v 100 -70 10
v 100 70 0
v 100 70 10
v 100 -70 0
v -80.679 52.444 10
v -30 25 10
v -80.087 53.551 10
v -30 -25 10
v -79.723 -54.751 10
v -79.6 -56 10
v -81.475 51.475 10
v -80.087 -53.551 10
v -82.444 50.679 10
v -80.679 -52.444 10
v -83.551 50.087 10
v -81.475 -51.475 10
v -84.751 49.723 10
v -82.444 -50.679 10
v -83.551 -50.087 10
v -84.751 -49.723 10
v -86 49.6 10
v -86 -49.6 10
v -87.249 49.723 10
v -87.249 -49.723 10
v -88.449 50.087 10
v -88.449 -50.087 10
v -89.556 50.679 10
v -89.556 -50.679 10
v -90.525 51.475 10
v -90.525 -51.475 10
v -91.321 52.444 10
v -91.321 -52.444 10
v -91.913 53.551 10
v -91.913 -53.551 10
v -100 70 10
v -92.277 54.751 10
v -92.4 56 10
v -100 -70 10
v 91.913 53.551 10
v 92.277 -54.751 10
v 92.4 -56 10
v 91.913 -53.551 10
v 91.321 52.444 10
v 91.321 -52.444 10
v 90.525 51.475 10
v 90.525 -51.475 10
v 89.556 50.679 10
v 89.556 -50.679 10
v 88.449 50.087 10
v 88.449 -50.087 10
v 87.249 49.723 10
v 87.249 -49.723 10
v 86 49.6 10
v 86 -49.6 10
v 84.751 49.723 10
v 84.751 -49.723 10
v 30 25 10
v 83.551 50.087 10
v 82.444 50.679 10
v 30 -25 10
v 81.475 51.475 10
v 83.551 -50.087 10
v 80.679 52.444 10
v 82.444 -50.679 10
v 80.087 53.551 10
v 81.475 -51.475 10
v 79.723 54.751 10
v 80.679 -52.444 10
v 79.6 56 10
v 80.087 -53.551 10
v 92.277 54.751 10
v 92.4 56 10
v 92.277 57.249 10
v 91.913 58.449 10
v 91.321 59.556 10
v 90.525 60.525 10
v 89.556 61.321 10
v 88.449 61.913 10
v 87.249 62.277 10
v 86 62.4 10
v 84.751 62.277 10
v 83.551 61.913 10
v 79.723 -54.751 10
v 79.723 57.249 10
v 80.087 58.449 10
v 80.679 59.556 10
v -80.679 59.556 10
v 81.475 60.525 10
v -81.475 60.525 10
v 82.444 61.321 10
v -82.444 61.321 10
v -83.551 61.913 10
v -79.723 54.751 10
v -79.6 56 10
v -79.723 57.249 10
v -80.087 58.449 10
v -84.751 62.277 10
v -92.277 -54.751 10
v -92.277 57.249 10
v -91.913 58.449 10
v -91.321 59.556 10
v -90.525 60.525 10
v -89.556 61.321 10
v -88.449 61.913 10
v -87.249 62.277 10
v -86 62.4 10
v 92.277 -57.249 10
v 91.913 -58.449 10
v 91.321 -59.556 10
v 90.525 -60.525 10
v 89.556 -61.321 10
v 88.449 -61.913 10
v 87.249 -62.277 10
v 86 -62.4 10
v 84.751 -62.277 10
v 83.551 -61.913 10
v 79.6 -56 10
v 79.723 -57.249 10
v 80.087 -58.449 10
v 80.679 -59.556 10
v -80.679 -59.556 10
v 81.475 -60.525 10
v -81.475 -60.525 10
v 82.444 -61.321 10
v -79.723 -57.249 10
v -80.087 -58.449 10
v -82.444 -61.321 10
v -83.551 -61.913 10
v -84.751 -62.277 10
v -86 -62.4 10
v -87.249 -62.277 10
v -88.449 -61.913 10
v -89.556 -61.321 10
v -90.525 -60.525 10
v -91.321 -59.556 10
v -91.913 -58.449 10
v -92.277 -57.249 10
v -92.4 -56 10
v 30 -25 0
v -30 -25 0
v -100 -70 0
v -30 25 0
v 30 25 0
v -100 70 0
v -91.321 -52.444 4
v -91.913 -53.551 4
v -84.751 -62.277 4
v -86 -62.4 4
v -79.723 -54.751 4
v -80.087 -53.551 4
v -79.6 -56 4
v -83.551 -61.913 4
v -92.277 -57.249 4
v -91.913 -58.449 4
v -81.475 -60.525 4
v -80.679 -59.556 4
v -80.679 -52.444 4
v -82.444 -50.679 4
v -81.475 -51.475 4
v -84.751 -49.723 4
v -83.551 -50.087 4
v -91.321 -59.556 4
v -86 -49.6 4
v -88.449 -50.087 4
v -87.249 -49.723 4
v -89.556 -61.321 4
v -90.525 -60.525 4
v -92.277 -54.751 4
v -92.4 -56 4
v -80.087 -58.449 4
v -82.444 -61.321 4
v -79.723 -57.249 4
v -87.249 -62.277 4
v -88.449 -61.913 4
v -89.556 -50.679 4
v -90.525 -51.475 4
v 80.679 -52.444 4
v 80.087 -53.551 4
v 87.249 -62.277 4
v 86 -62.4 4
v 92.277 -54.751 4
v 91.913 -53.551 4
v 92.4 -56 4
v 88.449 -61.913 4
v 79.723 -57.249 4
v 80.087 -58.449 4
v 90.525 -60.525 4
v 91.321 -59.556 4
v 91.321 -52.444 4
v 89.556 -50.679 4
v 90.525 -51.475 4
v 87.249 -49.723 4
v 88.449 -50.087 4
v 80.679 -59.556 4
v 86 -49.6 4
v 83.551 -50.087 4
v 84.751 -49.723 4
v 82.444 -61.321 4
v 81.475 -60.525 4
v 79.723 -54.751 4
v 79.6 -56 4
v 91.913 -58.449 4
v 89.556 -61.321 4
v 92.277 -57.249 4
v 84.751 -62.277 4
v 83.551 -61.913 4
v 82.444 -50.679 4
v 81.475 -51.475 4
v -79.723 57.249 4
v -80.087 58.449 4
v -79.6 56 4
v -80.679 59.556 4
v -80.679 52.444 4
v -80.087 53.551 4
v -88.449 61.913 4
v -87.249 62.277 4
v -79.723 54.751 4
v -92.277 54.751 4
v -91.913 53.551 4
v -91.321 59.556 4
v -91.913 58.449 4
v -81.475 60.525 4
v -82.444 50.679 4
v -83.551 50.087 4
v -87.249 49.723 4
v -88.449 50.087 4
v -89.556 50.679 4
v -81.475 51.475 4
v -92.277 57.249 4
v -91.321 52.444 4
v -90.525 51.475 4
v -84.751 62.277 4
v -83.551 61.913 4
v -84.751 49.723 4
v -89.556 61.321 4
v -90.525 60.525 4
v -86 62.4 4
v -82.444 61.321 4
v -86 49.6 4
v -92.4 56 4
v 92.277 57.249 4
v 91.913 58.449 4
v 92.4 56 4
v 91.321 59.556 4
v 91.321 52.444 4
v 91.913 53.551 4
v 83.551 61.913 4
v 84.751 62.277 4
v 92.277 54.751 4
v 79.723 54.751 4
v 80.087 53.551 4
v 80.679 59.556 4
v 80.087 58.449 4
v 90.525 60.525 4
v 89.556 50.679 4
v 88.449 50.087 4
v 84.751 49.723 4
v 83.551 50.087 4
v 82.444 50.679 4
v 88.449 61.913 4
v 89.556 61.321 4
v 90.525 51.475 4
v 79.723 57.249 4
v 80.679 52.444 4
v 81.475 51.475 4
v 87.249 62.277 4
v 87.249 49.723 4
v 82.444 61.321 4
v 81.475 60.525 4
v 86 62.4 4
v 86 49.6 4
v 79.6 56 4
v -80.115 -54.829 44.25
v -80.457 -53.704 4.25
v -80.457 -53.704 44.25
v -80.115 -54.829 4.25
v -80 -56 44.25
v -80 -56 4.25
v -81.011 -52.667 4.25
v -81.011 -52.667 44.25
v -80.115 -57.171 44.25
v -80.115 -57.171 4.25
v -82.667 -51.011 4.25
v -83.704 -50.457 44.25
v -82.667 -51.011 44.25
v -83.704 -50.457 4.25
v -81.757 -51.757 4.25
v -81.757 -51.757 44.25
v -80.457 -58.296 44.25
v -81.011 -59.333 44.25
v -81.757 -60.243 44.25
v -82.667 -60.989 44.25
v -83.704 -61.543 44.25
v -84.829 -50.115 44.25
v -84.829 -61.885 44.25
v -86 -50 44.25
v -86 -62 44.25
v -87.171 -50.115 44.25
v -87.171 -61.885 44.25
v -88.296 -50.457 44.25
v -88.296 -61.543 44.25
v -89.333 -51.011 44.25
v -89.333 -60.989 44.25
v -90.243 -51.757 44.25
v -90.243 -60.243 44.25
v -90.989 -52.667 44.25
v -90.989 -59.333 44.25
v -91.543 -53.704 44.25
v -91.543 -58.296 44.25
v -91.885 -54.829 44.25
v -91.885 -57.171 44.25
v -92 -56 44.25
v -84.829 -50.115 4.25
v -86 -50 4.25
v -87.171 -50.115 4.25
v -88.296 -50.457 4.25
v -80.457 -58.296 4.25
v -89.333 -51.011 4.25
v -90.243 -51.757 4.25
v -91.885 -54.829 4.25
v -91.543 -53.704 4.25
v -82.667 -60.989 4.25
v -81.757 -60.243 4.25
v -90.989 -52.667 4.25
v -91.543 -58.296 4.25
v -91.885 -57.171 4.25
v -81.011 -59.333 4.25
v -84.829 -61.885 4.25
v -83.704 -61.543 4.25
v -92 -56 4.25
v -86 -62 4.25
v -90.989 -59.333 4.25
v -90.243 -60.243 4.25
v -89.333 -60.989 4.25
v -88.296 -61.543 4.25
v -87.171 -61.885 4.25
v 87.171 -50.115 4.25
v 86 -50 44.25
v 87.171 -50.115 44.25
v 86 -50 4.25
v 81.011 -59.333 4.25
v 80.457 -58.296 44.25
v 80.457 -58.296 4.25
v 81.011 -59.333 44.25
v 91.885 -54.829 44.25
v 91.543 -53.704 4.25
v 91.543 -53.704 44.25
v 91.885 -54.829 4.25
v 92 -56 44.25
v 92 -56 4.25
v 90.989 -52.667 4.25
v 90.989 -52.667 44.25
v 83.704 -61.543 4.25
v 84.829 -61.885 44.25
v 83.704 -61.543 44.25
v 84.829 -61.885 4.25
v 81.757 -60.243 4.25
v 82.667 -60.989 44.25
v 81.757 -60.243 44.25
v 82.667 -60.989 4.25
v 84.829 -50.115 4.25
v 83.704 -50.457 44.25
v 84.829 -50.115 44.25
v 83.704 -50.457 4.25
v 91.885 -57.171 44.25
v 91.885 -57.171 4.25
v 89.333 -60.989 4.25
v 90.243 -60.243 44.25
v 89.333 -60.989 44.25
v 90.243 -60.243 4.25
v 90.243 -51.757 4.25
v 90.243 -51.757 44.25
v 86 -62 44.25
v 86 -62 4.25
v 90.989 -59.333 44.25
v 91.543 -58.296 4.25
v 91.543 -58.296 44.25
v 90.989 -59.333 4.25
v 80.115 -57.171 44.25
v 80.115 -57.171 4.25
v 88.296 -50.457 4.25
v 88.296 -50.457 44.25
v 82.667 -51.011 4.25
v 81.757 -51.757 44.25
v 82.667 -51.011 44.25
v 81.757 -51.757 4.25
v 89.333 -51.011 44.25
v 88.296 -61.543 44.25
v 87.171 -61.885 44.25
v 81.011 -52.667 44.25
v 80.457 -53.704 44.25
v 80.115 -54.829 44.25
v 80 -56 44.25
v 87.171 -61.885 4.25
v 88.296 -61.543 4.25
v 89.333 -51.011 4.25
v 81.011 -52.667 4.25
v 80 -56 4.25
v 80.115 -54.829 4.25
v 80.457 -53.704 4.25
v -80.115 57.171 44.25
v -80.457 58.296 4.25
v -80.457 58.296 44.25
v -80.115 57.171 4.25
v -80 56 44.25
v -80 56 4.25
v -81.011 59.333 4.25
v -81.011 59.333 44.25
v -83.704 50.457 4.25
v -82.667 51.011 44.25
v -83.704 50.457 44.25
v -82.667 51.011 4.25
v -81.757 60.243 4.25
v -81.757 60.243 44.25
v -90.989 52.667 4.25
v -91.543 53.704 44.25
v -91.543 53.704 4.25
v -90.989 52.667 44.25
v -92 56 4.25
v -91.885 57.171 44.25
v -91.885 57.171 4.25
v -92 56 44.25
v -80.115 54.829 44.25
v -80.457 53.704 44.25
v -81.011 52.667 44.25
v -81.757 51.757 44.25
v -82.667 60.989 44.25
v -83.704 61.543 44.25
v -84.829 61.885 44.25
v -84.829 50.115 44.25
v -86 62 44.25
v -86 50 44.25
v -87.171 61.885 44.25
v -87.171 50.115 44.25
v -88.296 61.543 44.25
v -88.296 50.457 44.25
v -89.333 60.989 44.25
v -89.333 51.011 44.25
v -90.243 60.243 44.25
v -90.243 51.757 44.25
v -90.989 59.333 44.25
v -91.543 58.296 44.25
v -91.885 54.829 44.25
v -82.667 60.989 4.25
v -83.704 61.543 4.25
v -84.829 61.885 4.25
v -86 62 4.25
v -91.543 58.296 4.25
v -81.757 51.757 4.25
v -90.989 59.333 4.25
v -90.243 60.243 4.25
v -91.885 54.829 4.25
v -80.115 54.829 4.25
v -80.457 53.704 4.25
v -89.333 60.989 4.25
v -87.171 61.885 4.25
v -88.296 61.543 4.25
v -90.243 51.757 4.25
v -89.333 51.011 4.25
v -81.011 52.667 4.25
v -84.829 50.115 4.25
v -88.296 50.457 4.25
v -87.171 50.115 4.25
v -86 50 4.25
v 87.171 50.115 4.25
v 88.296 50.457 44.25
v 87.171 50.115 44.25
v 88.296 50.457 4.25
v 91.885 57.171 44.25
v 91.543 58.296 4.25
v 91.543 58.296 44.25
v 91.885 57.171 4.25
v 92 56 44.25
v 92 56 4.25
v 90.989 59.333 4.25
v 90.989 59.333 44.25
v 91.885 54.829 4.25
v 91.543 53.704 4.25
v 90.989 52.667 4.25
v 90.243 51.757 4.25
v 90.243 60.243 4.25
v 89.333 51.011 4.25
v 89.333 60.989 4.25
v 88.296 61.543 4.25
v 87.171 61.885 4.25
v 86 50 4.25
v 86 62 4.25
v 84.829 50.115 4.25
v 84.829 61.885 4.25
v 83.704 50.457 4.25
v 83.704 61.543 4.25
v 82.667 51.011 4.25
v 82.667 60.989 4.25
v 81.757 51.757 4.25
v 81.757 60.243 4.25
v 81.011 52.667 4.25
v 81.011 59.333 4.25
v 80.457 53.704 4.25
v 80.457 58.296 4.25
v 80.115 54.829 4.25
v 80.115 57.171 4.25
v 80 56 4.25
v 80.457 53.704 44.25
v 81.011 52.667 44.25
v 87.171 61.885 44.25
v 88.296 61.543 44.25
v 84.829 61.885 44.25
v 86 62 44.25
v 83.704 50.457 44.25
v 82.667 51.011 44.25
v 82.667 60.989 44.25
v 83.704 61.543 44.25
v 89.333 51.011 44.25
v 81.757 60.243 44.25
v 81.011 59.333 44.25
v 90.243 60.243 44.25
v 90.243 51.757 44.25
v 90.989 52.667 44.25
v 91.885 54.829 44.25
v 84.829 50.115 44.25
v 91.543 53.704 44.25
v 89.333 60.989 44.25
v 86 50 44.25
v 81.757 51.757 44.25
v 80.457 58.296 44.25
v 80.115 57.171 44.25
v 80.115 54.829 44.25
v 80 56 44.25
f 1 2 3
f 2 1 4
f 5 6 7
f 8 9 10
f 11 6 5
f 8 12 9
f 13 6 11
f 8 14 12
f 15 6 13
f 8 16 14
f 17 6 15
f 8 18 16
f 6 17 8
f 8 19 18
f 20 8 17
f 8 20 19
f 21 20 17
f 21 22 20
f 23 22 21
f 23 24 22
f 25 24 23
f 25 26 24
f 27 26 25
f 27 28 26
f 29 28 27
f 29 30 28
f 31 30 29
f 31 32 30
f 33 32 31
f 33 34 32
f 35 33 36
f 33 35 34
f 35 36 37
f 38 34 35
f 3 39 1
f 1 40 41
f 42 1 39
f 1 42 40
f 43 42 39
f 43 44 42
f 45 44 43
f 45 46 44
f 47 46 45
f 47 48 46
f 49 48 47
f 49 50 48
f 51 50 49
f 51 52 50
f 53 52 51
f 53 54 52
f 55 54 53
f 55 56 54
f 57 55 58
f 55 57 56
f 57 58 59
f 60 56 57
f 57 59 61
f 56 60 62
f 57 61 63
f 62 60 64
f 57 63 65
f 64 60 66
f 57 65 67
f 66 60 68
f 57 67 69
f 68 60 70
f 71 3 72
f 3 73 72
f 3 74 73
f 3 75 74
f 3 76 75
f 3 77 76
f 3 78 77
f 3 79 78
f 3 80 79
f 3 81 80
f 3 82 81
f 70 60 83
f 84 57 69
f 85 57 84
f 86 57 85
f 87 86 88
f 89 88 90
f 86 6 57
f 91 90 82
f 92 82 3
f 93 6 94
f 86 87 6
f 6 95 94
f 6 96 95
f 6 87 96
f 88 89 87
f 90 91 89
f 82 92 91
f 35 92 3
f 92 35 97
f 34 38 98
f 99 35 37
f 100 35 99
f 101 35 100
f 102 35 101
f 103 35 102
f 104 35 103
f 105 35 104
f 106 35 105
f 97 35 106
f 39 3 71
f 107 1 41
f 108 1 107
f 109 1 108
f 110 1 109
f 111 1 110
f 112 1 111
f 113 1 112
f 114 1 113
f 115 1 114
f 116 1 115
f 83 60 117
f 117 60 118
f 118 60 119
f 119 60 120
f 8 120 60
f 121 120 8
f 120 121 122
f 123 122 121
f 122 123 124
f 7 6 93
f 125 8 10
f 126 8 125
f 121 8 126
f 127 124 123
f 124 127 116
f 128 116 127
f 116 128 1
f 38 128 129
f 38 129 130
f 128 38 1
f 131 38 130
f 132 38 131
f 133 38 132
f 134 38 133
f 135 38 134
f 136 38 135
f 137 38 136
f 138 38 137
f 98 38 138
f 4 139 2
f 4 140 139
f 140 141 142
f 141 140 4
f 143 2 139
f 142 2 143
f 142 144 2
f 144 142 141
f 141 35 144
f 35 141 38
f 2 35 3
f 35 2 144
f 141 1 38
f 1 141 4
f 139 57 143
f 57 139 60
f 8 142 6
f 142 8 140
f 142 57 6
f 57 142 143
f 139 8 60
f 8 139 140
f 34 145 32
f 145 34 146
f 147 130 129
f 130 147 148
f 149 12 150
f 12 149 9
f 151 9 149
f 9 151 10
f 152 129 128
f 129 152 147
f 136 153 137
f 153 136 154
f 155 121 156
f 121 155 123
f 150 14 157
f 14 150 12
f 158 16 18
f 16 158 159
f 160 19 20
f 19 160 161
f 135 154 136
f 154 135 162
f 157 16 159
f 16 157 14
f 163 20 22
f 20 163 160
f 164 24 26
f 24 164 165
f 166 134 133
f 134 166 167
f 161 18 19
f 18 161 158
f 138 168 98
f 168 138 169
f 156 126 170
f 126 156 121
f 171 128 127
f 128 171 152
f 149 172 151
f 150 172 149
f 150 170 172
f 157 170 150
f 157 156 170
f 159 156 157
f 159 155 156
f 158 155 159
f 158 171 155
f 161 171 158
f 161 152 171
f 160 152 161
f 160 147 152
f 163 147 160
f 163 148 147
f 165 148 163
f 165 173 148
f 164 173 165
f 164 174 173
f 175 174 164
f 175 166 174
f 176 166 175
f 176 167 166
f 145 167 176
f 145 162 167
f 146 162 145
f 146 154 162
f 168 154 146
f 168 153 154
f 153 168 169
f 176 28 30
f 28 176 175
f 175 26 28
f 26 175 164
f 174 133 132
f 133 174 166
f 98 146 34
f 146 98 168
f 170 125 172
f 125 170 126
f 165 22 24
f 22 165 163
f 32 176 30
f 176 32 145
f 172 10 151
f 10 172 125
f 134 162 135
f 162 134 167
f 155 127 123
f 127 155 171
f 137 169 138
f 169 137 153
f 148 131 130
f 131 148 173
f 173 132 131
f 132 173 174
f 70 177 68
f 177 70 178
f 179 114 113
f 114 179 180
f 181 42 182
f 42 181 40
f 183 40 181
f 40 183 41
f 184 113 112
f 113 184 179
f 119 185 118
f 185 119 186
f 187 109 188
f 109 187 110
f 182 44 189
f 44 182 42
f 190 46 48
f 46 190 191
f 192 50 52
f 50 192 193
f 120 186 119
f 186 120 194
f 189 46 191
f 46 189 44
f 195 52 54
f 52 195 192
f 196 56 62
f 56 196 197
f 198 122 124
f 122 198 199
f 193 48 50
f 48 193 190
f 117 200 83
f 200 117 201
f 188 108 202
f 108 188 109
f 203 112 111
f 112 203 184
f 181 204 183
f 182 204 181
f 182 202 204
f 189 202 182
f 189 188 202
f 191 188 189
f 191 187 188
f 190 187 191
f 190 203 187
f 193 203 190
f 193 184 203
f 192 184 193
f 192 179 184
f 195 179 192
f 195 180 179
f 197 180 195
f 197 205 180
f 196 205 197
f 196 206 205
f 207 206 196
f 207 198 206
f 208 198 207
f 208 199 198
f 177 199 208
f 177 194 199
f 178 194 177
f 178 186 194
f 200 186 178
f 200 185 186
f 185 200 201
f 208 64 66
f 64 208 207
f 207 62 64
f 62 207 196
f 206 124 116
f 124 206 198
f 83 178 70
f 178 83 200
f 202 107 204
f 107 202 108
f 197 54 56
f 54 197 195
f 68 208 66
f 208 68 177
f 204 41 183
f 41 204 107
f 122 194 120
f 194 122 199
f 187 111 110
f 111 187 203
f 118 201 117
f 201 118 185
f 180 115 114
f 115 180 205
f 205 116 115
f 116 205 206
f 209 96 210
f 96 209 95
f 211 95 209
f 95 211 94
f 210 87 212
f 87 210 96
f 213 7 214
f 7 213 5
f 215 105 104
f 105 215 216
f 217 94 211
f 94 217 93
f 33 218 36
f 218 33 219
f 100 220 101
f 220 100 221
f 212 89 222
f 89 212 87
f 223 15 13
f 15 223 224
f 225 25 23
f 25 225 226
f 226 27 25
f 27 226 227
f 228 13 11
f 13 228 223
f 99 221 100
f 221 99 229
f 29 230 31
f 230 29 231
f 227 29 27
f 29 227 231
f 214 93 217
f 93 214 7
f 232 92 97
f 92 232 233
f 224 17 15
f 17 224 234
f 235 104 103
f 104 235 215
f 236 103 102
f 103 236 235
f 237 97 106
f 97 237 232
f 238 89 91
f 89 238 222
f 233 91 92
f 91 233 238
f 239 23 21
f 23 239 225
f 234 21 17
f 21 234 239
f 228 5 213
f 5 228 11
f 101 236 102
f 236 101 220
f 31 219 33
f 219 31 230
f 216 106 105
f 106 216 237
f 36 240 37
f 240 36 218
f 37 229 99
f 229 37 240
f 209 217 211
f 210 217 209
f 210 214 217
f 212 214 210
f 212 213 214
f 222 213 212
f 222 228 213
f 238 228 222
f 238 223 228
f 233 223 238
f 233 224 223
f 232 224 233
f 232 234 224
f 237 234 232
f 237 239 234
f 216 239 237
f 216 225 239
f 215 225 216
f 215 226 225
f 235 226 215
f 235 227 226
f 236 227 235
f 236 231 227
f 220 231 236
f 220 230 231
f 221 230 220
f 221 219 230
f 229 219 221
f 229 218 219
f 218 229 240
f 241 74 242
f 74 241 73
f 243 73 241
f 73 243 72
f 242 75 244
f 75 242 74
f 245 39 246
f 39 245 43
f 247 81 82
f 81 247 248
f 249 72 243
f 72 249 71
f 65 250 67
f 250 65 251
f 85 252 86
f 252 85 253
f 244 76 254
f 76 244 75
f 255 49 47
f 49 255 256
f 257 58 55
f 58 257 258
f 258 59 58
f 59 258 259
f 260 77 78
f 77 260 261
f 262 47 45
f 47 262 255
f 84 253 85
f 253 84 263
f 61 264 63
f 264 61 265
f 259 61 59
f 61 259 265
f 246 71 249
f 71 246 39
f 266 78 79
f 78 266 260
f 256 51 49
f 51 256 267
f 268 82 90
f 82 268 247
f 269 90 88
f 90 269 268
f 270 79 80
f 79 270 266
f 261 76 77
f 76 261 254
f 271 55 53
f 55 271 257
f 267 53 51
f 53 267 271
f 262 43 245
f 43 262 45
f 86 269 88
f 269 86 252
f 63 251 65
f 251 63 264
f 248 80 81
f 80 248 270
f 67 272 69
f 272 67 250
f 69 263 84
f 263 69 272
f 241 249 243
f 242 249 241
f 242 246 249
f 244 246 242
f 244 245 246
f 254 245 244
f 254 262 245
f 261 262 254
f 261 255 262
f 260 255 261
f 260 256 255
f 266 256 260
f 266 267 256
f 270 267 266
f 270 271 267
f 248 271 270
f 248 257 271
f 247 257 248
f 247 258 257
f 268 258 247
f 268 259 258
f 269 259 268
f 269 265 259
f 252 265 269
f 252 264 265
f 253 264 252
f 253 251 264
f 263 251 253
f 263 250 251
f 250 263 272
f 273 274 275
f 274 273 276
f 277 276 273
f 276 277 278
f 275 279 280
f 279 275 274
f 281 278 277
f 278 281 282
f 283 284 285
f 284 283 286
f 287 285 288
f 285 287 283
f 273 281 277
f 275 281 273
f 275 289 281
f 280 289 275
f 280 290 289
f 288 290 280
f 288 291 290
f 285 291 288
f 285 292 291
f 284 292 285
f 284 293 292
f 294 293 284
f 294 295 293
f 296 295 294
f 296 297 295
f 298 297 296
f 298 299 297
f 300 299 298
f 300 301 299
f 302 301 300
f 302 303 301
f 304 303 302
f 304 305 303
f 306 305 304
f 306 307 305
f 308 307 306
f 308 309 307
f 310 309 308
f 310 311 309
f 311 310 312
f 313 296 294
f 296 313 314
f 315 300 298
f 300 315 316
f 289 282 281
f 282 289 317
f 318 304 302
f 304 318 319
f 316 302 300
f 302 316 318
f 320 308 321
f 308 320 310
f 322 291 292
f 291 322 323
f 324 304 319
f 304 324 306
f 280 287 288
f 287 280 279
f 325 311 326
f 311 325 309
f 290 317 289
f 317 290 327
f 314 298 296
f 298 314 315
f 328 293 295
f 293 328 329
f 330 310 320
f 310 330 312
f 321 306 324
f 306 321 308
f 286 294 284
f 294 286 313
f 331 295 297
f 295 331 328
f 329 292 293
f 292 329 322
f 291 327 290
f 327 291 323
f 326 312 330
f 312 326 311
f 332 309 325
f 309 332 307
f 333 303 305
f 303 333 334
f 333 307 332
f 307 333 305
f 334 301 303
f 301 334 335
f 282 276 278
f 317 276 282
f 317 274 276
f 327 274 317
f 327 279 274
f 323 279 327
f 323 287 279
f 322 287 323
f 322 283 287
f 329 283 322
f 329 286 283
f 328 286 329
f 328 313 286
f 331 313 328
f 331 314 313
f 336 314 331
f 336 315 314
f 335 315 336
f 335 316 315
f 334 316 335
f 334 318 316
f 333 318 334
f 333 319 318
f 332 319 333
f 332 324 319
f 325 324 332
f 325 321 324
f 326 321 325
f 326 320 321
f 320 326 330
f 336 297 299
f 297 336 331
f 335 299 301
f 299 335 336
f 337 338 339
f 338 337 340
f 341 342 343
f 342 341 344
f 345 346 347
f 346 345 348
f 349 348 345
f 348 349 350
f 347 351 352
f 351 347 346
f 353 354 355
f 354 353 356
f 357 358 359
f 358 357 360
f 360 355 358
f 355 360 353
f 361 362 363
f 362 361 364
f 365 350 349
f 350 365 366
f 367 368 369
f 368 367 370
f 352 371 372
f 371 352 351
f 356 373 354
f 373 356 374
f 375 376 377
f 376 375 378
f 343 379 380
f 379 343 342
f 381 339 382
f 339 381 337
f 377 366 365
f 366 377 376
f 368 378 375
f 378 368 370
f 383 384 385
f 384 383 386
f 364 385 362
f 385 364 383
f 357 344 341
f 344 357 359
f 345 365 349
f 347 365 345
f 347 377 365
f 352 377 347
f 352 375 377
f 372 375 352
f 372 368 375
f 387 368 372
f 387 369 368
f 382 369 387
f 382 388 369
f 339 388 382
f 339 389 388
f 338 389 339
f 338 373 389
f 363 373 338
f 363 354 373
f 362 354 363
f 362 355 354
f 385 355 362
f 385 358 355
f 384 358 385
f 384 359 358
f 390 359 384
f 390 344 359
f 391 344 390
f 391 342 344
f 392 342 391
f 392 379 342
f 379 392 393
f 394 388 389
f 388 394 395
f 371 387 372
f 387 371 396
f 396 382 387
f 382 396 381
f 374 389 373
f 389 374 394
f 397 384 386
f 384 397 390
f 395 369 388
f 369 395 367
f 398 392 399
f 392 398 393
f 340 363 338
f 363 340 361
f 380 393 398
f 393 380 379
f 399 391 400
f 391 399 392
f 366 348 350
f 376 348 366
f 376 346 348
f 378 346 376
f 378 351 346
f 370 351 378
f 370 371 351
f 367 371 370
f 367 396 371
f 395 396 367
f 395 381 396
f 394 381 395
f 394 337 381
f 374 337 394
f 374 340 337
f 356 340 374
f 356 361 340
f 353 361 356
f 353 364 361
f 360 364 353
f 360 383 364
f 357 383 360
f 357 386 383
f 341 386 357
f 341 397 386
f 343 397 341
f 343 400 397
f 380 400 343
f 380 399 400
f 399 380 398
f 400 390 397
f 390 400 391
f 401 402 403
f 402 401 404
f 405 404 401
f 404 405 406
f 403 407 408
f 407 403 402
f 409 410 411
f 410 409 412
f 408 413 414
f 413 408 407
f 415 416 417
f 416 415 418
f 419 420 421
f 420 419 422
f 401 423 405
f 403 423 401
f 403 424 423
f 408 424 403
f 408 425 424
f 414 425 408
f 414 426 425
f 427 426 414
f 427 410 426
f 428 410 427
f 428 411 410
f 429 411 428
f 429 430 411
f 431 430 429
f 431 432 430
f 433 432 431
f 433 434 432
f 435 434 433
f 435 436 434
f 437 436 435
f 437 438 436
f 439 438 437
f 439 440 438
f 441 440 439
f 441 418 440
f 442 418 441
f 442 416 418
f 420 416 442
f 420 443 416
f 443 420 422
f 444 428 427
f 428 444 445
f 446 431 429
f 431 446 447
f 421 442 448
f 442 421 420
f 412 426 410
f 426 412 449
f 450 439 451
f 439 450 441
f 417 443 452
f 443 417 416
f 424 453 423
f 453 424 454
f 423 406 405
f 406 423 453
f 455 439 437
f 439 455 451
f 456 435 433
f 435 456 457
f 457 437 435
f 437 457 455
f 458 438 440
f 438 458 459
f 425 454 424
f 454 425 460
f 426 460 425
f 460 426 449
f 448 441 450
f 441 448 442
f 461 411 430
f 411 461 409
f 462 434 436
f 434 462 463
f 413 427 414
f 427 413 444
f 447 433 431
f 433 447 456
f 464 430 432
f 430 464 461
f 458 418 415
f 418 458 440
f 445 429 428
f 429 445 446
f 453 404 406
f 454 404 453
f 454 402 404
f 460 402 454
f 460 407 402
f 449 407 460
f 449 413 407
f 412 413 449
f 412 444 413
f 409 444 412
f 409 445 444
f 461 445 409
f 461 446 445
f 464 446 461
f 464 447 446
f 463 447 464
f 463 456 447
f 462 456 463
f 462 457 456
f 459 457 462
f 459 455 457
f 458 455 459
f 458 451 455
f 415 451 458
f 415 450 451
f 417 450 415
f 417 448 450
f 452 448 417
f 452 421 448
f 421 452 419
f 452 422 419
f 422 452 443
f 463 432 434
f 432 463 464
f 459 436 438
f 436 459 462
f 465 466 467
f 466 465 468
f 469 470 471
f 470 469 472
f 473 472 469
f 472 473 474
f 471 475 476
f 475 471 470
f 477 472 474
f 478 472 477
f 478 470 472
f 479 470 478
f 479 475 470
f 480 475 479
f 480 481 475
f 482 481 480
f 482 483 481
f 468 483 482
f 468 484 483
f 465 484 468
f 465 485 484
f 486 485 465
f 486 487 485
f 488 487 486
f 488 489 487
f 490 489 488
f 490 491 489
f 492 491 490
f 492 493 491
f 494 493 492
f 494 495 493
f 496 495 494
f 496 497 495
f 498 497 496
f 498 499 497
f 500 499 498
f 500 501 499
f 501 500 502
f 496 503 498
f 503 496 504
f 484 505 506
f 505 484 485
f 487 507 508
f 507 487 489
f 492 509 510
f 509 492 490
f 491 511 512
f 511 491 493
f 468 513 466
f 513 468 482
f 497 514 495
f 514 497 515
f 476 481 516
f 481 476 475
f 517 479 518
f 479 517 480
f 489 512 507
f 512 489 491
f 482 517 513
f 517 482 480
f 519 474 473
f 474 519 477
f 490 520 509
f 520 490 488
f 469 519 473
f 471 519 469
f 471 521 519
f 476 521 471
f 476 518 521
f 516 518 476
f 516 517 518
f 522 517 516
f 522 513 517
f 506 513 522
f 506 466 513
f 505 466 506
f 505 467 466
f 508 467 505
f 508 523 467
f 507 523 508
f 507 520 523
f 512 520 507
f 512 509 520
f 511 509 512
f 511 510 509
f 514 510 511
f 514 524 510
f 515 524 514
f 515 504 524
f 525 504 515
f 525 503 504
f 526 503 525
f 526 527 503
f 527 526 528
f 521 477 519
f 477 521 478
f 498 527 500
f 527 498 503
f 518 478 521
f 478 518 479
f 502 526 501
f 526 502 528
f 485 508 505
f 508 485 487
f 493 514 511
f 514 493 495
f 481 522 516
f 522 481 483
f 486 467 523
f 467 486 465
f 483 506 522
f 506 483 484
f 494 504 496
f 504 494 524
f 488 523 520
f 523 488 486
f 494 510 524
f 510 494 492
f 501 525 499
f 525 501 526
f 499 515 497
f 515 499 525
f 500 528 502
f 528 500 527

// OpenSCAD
$fn = 32;

// ------------------------------------------------------------------------
// Frame with four posts: 200 x 140 mm frame, four d12 posts
// Every part is its own module, assembly() places them once.
// ------------------------------------------------------------------------

// --- part 1 ---
module base_frame() {
  difference() {
    translate([-100, -70, 0]) cube([200, 140, 10]);
    translate([-30, -25, -1]) cube([60, 50, 12]);
    translate([-86, -56, 4]) cylinder(h = 7, d = 12.8);
    translate([86, -56, 4]) cylinder(h = 7, d = 12.8);
    translate([-86, 56, 4]) cylinder(h = 7, d = 12.8);
    translate([86, 56, 4]) cylinder(h = 7, d = 12.8);
  }
}

// --- part 2 ---
module post1() {
  cylinder(h = 40, d = 12);
}

// --- part 3 ---
module post2() {
  cylinder(h = 40, d = 12);
}

// --- part 4 ---
module post3() {
  cylinder(h = 40, d = 12);
}

// --- part 5 ---
module post4() {
  cylinder(h = 40, d = 12);
}

// --- assembly ---
module assembly() {
  translate([0, 0, 0]) rotate([0, 0, 0]) base_frame();
  translate([-86, -56, 4.25]) rotate([0, 0, 0]) post1();
  translate([86, -56, 4.25]) rotate([0, 0, 0]) post2();
  translate([-86, 56, 4.25]) rotate([0, 0, 0]) post3();
  translate([86, 56, 4.25]) rotate([0, 0, 0]) post4();
}

assembly();
